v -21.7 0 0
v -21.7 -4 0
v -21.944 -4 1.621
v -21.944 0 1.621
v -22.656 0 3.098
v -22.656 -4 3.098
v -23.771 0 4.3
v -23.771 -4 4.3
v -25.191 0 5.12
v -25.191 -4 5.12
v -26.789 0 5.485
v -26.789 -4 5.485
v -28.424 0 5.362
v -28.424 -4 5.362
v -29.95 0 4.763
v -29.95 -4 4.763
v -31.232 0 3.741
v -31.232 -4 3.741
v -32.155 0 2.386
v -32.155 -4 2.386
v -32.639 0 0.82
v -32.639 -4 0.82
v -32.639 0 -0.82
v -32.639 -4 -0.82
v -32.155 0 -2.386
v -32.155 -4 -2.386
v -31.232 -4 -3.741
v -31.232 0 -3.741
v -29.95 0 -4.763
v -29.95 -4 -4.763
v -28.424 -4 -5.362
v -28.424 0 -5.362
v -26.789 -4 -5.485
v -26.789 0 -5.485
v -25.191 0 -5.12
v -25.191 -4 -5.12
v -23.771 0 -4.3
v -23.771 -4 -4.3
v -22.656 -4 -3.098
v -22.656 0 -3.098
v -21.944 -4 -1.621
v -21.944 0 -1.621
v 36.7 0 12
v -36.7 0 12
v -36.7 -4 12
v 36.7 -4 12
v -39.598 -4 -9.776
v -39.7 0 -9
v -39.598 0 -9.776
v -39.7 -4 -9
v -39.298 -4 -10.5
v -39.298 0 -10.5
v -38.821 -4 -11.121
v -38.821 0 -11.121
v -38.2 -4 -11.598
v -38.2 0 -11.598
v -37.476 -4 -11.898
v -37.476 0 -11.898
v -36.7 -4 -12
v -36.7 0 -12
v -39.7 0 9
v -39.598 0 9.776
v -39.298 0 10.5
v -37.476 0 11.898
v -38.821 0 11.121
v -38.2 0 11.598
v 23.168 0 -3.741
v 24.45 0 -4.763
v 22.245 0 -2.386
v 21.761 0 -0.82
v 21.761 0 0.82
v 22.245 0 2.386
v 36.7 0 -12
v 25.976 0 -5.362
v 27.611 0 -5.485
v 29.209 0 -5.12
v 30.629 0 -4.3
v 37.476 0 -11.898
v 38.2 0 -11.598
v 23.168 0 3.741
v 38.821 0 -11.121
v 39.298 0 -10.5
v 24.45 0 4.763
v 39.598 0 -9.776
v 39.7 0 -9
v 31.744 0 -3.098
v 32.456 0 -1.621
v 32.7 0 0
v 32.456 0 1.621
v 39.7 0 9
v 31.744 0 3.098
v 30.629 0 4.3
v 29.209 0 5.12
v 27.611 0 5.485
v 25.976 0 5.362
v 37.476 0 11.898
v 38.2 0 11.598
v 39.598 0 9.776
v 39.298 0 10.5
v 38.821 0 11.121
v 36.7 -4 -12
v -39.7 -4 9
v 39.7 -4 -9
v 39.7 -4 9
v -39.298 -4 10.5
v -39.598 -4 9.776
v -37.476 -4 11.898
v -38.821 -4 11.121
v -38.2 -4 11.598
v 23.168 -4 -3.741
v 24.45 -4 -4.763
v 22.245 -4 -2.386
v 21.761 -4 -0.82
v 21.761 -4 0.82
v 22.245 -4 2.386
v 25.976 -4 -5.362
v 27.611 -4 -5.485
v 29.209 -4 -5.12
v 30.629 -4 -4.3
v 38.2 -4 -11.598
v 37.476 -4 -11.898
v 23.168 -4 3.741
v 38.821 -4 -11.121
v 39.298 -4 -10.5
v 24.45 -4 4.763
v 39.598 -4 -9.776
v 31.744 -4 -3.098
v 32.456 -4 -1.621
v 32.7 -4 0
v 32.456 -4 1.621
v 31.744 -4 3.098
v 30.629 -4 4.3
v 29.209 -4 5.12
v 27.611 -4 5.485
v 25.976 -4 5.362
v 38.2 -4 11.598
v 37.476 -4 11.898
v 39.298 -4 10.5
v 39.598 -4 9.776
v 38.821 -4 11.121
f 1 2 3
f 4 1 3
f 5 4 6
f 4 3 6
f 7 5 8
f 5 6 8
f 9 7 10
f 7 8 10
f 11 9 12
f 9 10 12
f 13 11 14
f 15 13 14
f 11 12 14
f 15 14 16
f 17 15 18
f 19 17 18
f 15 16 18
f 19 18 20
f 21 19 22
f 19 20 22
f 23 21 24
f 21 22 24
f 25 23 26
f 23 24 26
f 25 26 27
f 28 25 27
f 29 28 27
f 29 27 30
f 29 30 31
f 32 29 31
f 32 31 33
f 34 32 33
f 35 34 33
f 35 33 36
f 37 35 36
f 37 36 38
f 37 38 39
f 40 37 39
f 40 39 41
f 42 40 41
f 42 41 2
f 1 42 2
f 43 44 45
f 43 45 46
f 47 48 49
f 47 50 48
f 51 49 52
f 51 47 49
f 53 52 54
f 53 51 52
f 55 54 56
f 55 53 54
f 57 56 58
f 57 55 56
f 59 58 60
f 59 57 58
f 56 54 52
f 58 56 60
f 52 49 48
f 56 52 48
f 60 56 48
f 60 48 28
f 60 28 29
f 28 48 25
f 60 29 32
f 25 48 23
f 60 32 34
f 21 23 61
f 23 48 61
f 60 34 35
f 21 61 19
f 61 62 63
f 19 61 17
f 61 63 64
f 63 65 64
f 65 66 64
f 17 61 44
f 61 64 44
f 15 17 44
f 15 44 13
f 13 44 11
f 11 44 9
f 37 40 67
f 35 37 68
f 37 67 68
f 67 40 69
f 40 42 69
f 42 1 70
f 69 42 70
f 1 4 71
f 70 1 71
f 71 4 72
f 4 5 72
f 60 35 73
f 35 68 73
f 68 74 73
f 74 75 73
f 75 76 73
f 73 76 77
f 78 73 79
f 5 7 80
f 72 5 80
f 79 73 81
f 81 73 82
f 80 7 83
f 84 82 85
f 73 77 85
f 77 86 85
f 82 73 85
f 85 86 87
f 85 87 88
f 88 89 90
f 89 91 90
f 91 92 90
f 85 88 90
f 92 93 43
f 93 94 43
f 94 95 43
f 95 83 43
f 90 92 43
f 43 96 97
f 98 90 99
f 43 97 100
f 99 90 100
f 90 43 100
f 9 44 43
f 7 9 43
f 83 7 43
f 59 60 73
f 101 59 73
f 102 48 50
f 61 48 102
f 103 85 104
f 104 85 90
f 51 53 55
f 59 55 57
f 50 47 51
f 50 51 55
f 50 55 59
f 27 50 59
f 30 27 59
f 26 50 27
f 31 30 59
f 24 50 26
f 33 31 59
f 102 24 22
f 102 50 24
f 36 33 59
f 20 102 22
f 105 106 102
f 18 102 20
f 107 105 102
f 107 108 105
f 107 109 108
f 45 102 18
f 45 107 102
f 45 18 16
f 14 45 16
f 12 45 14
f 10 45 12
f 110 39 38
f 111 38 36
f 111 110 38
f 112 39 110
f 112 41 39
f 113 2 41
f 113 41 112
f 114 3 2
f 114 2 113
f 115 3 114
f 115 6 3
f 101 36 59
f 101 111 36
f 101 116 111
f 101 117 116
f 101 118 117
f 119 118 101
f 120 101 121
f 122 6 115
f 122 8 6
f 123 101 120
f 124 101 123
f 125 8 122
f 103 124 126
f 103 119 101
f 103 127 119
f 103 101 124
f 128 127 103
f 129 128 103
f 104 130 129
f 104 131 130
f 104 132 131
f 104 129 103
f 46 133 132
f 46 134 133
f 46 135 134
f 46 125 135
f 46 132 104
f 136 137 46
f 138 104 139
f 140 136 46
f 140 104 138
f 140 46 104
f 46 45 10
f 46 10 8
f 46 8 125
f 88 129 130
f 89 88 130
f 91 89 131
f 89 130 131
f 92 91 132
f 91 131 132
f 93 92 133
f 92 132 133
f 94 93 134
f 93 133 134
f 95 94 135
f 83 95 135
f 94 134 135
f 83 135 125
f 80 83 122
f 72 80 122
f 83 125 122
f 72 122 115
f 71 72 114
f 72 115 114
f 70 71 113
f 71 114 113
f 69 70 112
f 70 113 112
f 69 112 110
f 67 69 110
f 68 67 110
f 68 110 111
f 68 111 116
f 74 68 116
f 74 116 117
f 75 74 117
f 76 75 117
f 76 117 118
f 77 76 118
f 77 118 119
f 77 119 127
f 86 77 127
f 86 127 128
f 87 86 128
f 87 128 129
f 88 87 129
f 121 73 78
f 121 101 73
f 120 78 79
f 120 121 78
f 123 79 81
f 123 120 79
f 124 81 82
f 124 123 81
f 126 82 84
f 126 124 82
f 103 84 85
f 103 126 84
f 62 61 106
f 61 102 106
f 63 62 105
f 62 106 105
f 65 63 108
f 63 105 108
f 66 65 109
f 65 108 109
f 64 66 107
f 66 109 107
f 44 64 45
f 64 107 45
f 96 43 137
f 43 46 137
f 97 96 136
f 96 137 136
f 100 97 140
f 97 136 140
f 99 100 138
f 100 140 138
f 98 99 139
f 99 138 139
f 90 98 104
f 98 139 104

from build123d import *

# Parameters (mm, degrees)
F0_W     = 79.4
F0_H     = 24
F1_DEPTH = 4
F2_R     = 5.5
F3_DEPTH = 25
F4_R     = 3


with BuildPart() as f1:
    # F0 (on Front) → F1 (new body)
    with BuildSketch(Plane.XZ):
        Rectangle(F0_W, F0_H)
    extrude(amount=F1_DEPTH)

    # F2 (on face) → F3 (cut)
    with BuildSketch(Plane.XZ.offset(4)):
        with Locations((-27.2, 0)):
            Circle(F2_R)
        with Locations((27.2, 0)):
            Circle(F2_R)
    extrude(amount=-F3_DEPTH, mode=Mode.SUBTRACT)

    # F4
    f4_edges = [f1.edges().sort_by_distance(p)[0] for p in [
        (39.7, -2, 12),
        (39.7, -2, -12),
        (-39.7, -2, -12),
        (-39.7, -2, 12),
    ]]
    fillet(f4_edges, radius=F4_R)


solid = f1.part
